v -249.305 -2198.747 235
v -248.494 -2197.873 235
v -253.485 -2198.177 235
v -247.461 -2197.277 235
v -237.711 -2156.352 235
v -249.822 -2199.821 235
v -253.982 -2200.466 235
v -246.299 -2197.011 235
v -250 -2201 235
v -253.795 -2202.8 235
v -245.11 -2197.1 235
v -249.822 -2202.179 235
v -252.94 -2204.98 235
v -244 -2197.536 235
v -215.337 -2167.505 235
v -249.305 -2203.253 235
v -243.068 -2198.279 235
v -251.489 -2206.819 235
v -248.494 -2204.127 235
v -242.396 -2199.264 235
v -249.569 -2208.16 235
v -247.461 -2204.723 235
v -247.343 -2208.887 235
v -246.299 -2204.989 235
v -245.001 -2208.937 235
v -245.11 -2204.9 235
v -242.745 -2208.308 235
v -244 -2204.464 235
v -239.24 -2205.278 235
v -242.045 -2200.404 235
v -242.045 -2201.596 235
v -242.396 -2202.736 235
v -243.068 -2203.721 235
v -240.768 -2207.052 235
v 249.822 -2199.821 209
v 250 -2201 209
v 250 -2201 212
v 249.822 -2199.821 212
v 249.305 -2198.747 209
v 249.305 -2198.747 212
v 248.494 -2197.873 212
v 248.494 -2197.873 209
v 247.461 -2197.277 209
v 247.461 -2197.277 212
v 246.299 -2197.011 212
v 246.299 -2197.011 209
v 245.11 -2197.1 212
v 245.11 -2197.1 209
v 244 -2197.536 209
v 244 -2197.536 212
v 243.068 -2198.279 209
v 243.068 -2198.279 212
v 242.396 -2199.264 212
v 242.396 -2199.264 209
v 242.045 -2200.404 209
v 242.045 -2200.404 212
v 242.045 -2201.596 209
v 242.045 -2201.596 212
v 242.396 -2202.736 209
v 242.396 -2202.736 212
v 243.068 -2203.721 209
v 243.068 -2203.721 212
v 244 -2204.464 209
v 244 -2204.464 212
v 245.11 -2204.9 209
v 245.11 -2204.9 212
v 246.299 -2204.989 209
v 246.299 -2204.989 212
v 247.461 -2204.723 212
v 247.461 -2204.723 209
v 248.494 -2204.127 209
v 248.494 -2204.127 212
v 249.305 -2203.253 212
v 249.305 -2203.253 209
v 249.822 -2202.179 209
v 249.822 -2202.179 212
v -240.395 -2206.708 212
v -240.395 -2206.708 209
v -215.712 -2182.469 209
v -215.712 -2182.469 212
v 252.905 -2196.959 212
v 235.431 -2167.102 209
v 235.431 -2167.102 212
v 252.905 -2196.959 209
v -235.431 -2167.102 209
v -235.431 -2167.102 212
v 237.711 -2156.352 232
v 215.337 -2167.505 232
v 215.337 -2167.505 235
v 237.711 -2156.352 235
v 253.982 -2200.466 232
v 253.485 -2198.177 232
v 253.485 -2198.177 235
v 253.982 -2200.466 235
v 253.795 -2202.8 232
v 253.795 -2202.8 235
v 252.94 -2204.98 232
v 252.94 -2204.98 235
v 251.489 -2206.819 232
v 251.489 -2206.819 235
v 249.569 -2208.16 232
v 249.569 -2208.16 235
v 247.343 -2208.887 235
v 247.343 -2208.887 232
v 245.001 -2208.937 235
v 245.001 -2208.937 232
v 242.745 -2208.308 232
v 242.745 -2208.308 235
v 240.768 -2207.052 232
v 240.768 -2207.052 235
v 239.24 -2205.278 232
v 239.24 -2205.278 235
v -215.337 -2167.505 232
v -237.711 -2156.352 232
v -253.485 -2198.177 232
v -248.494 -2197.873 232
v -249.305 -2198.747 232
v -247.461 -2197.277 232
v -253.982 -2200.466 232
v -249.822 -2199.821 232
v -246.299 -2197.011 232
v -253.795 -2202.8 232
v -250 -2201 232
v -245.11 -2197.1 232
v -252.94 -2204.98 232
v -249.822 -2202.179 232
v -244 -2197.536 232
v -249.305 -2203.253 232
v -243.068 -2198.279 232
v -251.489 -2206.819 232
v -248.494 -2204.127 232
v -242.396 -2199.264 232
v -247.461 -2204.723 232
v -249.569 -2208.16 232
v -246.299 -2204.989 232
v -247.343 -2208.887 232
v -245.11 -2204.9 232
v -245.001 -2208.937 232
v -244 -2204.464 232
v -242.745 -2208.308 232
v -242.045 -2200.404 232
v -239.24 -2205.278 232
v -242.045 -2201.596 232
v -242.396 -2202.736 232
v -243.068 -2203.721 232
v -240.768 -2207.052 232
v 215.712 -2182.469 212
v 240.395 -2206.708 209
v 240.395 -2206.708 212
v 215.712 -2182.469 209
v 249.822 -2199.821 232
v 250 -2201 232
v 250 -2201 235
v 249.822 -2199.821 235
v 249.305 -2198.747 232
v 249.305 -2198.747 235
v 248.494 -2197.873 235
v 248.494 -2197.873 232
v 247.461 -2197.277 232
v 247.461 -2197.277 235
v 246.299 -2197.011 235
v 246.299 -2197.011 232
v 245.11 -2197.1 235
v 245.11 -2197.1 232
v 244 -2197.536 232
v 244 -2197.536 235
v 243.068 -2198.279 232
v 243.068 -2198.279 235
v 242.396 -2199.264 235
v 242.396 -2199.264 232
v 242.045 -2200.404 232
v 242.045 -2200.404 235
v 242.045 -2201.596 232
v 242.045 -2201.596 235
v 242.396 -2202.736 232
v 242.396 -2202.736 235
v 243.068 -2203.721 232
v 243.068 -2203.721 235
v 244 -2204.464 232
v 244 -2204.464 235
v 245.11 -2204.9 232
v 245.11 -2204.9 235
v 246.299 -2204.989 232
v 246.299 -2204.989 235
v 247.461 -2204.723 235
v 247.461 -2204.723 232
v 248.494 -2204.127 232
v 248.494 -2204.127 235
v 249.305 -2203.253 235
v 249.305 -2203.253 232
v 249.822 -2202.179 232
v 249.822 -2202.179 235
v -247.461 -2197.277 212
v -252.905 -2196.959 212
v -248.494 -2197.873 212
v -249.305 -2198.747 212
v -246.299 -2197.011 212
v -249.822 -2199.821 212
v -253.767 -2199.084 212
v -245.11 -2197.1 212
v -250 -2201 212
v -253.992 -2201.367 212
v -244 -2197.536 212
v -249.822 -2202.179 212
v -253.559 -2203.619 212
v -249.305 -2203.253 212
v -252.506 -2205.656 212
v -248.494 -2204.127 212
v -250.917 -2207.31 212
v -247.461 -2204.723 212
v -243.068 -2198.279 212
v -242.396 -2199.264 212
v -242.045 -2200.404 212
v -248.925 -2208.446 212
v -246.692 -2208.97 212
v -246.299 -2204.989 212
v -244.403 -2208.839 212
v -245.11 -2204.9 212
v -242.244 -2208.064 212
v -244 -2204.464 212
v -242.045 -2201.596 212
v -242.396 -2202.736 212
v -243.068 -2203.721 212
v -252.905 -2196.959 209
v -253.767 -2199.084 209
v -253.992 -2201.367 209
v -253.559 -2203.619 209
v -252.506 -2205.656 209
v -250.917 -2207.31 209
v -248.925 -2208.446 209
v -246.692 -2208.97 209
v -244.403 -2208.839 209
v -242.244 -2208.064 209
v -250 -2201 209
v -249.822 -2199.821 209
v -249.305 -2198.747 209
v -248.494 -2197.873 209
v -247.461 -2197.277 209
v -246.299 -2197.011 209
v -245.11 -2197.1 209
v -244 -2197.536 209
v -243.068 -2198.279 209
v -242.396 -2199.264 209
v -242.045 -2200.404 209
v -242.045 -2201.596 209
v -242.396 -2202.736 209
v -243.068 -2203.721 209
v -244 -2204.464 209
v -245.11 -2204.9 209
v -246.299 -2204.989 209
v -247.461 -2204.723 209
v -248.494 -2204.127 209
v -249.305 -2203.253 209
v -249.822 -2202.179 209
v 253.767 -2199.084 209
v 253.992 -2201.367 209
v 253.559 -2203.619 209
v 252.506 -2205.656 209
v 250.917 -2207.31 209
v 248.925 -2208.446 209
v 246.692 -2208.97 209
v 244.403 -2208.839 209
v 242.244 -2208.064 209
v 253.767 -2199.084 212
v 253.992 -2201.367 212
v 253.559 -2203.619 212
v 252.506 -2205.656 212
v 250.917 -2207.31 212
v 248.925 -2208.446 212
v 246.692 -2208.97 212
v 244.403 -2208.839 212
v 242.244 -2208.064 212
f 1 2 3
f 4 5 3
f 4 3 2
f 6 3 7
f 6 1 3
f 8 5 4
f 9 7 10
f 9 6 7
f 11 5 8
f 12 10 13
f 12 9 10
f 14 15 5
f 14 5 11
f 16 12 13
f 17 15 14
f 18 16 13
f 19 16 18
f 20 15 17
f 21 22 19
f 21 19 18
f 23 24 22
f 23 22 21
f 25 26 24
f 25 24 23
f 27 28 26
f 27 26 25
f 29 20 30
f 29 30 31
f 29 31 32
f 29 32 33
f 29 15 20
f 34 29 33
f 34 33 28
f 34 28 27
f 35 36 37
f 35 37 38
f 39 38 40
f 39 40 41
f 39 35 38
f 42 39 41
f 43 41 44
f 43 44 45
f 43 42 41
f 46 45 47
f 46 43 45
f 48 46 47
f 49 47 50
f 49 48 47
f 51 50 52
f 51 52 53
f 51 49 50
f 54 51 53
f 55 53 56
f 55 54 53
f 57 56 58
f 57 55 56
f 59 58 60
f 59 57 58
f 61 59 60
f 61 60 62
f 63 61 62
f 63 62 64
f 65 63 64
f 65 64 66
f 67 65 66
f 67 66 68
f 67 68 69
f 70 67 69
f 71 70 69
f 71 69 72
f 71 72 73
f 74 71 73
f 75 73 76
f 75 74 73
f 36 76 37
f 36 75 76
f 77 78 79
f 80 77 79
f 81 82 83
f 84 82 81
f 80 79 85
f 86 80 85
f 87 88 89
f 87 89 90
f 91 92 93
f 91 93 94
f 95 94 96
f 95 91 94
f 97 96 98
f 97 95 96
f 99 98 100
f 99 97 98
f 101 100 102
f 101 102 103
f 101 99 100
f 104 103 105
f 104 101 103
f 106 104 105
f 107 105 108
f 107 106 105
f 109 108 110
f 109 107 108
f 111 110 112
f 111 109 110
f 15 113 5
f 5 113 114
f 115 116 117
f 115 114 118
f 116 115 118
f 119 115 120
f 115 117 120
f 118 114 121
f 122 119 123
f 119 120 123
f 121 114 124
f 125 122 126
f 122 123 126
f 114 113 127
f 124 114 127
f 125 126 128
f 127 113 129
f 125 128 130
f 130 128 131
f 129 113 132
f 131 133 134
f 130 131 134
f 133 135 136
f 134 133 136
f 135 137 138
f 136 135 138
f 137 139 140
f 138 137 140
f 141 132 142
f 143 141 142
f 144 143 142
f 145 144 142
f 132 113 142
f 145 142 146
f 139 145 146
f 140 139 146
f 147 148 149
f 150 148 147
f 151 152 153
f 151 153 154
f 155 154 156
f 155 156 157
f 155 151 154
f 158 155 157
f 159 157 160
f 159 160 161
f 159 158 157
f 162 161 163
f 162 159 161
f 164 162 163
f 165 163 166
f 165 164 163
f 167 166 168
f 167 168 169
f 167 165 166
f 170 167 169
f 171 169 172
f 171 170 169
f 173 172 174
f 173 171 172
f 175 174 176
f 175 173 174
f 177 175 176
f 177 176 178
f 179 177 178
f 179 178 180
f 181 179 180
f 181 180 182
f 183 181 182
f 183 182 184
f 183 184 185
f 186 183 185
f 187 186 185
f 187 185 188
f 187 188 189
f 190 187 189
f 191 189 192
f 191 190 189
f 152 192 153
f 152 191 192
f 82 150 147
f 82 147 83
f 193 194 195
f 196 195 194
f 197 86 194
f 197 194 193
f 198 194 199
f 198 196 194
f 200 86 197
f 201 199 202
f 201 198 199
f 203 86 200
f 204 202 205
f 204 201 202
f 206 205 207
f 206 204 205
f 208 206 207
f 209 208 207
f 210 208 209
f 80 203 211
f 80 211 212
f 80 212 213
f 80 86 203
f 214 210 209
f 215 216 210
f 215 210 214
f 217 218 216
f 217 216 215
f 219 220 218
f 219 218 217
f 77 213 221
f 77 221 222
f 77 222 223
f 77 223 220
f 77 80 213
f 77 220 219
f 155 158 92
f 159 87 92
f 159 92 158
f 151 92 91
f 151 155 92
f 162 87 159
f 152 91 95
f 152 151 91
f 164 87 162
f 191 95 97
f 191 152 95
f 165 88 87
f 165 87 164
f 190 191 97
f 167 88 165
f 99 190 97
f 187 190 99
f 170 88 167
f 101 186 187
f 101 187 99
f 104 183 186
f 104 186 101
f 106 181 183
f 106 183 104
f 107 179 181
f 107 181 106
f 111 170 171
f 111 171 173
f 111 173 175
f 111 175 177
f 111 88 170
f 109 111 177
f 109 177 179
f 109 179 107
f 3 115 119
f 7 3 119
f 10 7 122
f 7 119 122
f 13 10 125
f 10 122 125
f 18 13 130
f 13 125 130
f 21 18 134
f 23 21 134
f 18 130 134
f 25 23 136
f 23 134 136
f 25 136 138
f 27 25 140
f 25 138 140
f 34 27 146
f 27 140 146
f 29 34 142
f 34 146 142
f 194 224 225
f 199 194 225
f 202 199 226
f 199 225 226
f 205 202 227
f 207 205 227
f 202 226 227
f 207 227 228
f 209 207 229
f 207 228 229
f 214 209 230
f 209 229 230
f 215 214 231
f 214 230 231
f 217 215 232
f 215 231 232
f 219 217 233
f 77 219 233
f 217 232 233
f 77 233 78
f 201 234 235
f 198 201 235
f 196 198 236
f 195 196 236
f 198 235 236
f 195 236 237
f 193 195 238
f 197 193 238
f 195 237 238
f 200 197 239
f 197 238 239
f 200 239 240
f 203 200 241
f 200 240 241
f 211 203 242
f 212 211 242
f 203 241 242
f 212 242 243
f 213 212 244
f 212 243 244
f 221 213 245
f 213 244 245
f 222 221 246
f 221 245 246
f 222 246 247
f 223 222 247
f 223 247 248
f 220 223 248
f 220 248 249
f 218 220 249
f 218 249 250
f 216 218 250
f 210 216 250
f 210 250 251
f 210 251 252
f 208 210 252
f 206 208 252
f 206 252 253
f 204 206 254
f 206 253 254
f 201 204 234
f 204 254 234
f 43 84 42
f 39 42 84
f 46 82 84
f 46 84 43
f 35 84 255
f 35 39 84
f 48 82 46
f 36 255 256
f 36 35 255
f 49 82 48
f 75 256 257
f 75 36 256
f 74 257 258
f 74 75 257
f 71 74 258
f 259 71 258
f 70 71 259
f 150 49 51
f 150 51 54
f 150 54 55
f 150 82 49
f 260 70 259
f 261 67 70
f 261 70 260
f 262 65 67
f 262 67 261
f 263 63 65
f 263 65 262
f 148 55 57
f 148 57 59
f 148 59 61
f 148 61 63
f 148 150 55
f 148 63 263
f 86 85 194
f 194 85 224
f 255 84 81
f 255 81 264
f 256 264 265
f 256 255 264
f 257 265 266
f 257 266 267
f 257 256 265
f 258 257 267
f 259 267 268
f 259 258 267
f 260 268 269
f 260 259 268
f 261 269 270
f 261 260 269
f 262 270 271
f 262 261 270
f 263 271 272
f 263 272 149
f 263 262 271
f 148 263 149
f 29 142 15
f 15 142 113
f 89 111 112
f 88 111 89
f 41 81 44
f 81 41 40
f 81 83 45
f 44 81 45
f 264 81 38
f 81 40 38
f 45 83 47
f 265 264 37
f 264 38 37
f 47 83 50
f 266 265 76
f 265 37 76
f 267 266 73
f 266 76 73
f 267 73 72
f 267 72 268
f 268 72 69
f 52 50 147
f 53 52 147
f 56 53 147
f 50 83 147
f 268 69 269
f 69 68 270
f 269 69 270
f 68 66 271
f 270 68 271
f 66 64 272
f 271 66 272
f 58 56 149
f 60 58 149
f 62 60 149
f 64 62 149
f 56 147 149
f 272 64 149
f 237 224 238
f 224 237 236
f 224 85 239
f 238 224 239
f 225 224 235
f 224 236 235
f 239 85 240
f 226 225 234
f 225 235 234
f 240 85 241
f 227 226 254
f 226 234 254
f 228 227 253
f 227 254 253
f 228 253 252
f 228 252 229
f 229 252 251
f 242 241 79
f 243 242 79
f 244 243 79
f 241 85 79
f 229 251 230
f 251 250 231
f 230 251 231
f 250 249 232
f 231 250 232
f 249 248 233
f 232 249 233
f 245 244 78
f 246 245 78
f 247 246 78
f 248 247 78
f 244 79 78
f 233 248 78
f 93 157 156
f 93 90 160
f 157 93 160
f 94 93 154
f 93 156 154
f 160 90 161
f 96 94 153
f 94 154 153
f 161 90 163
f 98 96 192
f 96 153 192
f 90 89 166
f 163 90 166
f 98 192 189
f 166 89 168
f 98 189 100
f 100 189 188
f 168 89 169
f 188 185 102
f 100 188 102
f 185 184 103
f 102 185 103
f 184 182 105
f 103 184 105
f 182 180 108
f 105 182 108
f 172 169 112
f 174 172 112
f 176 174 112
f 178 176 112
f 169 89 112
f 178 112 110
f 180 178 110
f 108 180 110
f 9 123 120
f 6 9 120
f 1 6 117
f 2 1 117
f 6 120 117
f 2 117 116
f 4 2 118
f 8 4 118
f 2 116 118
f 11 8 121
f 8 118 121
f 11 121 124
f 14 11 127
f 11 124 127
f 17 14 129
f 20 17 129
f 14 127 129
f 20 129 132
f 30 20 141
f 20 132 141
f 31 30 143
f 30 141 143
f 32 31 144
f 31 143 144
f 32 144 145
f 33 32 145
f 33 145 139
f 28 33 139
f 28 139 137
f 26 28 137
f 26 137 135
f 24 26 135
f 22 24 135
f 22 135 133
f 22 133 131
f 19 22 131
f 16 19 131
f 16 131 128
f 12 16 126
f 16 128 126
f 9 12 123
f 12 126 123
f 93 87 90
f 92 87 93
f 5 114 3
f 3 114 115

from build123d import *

# Parameters (mm, degrees)
F_3DSKETCH1_R        = 4
BOSS_EXTRUDE_U_DEPTH = 3
BOSS_EXTRUDE_L_START = -3
F_3DSKETCH2_R        = 4
BOSS_EXTRUDE_L_DEPTH = 3


with BuildPart() as part:
    # 3DSketch1 → Boss-Extrude-U (new body)
    with BuildSketch(Plane(origin=(239.239864032, -2205.277915578, 232), x_dir=(-0.031234182001520523, 0.9995120939111722, 0), z_dir=(0, 0, 1))):
        with BuildLine():
            Line((0, 0), (38.500980332, 22.711737925))
            Line((38.500980332, 22.711737925), (48.94975827, 0))
            Line((48.94975827, 0), (6.652616688, -14.460302212))
            ThreePointArc((6.652616688, -14.460302212), (-3.203075097, -10.234063791), (0, 0))
        make_face()
        with Locations(Location((4.064681039, -6.890454851, 0), (0, 0, 268.210122088))):
            Circle(F_3DSKETCH1_R, mode=Mode.SUBTRACT)
    extrude(amount=BOSS_EXTRUDE_U_DEPTH)


with BuildPart() as body_2:
    # 3DSketch2 → Boss-Extrude-L (new body)
    with BuildSketch(Plane(origin=(240.394747323, -2206.707989351, 212), x_dir=(-0.12435355031356123, 0.9922379727285248, 3.198635891212861e-14), z_dir=(0, 0, 1)).offset(BOSS_EXTRUDE_L_START)):
        with BuildLine():
            Line((0, 0), (27.119996267, 21.477223018))
            Line((27.119996267, 21.477223018), (39.915655353, 0))
            Line((39.915655353, 0), (8.117448119, -13.624952215))
            ThreePointArc((8.117448119, -13.624952215), (-1.906060655, -10.366164201), (0, 0))
        make_face()
        with Locations(Location((4.966650711, -6.271553293, 0), (0, 0, 262.856574329))):
            Circle(F_3DSKETCH2_R, mode=Mode.SUBTRACT)
    extrude(amount=BOSS_EXTRUDE_L_DEPTH)


with BuildPart() as body_3:
    # Mirror1: mirrored copy
    add(part.part.mirror(Plane(origin=(0, 0, 0), x_dir=(0, 0, 1), z_dir=(1, 0, 0))))


with BuildPart() as body_4:
    # Mirror1 2: mirrored copy
    add(body_2.part.mirror(Plane(origin=(0, 0, 0), x_dir=(0, 0, 1), z_dir=(1, 0, 0))))


solid = Compound([part.part, body_2.part, body_3.part, body_4.part])
